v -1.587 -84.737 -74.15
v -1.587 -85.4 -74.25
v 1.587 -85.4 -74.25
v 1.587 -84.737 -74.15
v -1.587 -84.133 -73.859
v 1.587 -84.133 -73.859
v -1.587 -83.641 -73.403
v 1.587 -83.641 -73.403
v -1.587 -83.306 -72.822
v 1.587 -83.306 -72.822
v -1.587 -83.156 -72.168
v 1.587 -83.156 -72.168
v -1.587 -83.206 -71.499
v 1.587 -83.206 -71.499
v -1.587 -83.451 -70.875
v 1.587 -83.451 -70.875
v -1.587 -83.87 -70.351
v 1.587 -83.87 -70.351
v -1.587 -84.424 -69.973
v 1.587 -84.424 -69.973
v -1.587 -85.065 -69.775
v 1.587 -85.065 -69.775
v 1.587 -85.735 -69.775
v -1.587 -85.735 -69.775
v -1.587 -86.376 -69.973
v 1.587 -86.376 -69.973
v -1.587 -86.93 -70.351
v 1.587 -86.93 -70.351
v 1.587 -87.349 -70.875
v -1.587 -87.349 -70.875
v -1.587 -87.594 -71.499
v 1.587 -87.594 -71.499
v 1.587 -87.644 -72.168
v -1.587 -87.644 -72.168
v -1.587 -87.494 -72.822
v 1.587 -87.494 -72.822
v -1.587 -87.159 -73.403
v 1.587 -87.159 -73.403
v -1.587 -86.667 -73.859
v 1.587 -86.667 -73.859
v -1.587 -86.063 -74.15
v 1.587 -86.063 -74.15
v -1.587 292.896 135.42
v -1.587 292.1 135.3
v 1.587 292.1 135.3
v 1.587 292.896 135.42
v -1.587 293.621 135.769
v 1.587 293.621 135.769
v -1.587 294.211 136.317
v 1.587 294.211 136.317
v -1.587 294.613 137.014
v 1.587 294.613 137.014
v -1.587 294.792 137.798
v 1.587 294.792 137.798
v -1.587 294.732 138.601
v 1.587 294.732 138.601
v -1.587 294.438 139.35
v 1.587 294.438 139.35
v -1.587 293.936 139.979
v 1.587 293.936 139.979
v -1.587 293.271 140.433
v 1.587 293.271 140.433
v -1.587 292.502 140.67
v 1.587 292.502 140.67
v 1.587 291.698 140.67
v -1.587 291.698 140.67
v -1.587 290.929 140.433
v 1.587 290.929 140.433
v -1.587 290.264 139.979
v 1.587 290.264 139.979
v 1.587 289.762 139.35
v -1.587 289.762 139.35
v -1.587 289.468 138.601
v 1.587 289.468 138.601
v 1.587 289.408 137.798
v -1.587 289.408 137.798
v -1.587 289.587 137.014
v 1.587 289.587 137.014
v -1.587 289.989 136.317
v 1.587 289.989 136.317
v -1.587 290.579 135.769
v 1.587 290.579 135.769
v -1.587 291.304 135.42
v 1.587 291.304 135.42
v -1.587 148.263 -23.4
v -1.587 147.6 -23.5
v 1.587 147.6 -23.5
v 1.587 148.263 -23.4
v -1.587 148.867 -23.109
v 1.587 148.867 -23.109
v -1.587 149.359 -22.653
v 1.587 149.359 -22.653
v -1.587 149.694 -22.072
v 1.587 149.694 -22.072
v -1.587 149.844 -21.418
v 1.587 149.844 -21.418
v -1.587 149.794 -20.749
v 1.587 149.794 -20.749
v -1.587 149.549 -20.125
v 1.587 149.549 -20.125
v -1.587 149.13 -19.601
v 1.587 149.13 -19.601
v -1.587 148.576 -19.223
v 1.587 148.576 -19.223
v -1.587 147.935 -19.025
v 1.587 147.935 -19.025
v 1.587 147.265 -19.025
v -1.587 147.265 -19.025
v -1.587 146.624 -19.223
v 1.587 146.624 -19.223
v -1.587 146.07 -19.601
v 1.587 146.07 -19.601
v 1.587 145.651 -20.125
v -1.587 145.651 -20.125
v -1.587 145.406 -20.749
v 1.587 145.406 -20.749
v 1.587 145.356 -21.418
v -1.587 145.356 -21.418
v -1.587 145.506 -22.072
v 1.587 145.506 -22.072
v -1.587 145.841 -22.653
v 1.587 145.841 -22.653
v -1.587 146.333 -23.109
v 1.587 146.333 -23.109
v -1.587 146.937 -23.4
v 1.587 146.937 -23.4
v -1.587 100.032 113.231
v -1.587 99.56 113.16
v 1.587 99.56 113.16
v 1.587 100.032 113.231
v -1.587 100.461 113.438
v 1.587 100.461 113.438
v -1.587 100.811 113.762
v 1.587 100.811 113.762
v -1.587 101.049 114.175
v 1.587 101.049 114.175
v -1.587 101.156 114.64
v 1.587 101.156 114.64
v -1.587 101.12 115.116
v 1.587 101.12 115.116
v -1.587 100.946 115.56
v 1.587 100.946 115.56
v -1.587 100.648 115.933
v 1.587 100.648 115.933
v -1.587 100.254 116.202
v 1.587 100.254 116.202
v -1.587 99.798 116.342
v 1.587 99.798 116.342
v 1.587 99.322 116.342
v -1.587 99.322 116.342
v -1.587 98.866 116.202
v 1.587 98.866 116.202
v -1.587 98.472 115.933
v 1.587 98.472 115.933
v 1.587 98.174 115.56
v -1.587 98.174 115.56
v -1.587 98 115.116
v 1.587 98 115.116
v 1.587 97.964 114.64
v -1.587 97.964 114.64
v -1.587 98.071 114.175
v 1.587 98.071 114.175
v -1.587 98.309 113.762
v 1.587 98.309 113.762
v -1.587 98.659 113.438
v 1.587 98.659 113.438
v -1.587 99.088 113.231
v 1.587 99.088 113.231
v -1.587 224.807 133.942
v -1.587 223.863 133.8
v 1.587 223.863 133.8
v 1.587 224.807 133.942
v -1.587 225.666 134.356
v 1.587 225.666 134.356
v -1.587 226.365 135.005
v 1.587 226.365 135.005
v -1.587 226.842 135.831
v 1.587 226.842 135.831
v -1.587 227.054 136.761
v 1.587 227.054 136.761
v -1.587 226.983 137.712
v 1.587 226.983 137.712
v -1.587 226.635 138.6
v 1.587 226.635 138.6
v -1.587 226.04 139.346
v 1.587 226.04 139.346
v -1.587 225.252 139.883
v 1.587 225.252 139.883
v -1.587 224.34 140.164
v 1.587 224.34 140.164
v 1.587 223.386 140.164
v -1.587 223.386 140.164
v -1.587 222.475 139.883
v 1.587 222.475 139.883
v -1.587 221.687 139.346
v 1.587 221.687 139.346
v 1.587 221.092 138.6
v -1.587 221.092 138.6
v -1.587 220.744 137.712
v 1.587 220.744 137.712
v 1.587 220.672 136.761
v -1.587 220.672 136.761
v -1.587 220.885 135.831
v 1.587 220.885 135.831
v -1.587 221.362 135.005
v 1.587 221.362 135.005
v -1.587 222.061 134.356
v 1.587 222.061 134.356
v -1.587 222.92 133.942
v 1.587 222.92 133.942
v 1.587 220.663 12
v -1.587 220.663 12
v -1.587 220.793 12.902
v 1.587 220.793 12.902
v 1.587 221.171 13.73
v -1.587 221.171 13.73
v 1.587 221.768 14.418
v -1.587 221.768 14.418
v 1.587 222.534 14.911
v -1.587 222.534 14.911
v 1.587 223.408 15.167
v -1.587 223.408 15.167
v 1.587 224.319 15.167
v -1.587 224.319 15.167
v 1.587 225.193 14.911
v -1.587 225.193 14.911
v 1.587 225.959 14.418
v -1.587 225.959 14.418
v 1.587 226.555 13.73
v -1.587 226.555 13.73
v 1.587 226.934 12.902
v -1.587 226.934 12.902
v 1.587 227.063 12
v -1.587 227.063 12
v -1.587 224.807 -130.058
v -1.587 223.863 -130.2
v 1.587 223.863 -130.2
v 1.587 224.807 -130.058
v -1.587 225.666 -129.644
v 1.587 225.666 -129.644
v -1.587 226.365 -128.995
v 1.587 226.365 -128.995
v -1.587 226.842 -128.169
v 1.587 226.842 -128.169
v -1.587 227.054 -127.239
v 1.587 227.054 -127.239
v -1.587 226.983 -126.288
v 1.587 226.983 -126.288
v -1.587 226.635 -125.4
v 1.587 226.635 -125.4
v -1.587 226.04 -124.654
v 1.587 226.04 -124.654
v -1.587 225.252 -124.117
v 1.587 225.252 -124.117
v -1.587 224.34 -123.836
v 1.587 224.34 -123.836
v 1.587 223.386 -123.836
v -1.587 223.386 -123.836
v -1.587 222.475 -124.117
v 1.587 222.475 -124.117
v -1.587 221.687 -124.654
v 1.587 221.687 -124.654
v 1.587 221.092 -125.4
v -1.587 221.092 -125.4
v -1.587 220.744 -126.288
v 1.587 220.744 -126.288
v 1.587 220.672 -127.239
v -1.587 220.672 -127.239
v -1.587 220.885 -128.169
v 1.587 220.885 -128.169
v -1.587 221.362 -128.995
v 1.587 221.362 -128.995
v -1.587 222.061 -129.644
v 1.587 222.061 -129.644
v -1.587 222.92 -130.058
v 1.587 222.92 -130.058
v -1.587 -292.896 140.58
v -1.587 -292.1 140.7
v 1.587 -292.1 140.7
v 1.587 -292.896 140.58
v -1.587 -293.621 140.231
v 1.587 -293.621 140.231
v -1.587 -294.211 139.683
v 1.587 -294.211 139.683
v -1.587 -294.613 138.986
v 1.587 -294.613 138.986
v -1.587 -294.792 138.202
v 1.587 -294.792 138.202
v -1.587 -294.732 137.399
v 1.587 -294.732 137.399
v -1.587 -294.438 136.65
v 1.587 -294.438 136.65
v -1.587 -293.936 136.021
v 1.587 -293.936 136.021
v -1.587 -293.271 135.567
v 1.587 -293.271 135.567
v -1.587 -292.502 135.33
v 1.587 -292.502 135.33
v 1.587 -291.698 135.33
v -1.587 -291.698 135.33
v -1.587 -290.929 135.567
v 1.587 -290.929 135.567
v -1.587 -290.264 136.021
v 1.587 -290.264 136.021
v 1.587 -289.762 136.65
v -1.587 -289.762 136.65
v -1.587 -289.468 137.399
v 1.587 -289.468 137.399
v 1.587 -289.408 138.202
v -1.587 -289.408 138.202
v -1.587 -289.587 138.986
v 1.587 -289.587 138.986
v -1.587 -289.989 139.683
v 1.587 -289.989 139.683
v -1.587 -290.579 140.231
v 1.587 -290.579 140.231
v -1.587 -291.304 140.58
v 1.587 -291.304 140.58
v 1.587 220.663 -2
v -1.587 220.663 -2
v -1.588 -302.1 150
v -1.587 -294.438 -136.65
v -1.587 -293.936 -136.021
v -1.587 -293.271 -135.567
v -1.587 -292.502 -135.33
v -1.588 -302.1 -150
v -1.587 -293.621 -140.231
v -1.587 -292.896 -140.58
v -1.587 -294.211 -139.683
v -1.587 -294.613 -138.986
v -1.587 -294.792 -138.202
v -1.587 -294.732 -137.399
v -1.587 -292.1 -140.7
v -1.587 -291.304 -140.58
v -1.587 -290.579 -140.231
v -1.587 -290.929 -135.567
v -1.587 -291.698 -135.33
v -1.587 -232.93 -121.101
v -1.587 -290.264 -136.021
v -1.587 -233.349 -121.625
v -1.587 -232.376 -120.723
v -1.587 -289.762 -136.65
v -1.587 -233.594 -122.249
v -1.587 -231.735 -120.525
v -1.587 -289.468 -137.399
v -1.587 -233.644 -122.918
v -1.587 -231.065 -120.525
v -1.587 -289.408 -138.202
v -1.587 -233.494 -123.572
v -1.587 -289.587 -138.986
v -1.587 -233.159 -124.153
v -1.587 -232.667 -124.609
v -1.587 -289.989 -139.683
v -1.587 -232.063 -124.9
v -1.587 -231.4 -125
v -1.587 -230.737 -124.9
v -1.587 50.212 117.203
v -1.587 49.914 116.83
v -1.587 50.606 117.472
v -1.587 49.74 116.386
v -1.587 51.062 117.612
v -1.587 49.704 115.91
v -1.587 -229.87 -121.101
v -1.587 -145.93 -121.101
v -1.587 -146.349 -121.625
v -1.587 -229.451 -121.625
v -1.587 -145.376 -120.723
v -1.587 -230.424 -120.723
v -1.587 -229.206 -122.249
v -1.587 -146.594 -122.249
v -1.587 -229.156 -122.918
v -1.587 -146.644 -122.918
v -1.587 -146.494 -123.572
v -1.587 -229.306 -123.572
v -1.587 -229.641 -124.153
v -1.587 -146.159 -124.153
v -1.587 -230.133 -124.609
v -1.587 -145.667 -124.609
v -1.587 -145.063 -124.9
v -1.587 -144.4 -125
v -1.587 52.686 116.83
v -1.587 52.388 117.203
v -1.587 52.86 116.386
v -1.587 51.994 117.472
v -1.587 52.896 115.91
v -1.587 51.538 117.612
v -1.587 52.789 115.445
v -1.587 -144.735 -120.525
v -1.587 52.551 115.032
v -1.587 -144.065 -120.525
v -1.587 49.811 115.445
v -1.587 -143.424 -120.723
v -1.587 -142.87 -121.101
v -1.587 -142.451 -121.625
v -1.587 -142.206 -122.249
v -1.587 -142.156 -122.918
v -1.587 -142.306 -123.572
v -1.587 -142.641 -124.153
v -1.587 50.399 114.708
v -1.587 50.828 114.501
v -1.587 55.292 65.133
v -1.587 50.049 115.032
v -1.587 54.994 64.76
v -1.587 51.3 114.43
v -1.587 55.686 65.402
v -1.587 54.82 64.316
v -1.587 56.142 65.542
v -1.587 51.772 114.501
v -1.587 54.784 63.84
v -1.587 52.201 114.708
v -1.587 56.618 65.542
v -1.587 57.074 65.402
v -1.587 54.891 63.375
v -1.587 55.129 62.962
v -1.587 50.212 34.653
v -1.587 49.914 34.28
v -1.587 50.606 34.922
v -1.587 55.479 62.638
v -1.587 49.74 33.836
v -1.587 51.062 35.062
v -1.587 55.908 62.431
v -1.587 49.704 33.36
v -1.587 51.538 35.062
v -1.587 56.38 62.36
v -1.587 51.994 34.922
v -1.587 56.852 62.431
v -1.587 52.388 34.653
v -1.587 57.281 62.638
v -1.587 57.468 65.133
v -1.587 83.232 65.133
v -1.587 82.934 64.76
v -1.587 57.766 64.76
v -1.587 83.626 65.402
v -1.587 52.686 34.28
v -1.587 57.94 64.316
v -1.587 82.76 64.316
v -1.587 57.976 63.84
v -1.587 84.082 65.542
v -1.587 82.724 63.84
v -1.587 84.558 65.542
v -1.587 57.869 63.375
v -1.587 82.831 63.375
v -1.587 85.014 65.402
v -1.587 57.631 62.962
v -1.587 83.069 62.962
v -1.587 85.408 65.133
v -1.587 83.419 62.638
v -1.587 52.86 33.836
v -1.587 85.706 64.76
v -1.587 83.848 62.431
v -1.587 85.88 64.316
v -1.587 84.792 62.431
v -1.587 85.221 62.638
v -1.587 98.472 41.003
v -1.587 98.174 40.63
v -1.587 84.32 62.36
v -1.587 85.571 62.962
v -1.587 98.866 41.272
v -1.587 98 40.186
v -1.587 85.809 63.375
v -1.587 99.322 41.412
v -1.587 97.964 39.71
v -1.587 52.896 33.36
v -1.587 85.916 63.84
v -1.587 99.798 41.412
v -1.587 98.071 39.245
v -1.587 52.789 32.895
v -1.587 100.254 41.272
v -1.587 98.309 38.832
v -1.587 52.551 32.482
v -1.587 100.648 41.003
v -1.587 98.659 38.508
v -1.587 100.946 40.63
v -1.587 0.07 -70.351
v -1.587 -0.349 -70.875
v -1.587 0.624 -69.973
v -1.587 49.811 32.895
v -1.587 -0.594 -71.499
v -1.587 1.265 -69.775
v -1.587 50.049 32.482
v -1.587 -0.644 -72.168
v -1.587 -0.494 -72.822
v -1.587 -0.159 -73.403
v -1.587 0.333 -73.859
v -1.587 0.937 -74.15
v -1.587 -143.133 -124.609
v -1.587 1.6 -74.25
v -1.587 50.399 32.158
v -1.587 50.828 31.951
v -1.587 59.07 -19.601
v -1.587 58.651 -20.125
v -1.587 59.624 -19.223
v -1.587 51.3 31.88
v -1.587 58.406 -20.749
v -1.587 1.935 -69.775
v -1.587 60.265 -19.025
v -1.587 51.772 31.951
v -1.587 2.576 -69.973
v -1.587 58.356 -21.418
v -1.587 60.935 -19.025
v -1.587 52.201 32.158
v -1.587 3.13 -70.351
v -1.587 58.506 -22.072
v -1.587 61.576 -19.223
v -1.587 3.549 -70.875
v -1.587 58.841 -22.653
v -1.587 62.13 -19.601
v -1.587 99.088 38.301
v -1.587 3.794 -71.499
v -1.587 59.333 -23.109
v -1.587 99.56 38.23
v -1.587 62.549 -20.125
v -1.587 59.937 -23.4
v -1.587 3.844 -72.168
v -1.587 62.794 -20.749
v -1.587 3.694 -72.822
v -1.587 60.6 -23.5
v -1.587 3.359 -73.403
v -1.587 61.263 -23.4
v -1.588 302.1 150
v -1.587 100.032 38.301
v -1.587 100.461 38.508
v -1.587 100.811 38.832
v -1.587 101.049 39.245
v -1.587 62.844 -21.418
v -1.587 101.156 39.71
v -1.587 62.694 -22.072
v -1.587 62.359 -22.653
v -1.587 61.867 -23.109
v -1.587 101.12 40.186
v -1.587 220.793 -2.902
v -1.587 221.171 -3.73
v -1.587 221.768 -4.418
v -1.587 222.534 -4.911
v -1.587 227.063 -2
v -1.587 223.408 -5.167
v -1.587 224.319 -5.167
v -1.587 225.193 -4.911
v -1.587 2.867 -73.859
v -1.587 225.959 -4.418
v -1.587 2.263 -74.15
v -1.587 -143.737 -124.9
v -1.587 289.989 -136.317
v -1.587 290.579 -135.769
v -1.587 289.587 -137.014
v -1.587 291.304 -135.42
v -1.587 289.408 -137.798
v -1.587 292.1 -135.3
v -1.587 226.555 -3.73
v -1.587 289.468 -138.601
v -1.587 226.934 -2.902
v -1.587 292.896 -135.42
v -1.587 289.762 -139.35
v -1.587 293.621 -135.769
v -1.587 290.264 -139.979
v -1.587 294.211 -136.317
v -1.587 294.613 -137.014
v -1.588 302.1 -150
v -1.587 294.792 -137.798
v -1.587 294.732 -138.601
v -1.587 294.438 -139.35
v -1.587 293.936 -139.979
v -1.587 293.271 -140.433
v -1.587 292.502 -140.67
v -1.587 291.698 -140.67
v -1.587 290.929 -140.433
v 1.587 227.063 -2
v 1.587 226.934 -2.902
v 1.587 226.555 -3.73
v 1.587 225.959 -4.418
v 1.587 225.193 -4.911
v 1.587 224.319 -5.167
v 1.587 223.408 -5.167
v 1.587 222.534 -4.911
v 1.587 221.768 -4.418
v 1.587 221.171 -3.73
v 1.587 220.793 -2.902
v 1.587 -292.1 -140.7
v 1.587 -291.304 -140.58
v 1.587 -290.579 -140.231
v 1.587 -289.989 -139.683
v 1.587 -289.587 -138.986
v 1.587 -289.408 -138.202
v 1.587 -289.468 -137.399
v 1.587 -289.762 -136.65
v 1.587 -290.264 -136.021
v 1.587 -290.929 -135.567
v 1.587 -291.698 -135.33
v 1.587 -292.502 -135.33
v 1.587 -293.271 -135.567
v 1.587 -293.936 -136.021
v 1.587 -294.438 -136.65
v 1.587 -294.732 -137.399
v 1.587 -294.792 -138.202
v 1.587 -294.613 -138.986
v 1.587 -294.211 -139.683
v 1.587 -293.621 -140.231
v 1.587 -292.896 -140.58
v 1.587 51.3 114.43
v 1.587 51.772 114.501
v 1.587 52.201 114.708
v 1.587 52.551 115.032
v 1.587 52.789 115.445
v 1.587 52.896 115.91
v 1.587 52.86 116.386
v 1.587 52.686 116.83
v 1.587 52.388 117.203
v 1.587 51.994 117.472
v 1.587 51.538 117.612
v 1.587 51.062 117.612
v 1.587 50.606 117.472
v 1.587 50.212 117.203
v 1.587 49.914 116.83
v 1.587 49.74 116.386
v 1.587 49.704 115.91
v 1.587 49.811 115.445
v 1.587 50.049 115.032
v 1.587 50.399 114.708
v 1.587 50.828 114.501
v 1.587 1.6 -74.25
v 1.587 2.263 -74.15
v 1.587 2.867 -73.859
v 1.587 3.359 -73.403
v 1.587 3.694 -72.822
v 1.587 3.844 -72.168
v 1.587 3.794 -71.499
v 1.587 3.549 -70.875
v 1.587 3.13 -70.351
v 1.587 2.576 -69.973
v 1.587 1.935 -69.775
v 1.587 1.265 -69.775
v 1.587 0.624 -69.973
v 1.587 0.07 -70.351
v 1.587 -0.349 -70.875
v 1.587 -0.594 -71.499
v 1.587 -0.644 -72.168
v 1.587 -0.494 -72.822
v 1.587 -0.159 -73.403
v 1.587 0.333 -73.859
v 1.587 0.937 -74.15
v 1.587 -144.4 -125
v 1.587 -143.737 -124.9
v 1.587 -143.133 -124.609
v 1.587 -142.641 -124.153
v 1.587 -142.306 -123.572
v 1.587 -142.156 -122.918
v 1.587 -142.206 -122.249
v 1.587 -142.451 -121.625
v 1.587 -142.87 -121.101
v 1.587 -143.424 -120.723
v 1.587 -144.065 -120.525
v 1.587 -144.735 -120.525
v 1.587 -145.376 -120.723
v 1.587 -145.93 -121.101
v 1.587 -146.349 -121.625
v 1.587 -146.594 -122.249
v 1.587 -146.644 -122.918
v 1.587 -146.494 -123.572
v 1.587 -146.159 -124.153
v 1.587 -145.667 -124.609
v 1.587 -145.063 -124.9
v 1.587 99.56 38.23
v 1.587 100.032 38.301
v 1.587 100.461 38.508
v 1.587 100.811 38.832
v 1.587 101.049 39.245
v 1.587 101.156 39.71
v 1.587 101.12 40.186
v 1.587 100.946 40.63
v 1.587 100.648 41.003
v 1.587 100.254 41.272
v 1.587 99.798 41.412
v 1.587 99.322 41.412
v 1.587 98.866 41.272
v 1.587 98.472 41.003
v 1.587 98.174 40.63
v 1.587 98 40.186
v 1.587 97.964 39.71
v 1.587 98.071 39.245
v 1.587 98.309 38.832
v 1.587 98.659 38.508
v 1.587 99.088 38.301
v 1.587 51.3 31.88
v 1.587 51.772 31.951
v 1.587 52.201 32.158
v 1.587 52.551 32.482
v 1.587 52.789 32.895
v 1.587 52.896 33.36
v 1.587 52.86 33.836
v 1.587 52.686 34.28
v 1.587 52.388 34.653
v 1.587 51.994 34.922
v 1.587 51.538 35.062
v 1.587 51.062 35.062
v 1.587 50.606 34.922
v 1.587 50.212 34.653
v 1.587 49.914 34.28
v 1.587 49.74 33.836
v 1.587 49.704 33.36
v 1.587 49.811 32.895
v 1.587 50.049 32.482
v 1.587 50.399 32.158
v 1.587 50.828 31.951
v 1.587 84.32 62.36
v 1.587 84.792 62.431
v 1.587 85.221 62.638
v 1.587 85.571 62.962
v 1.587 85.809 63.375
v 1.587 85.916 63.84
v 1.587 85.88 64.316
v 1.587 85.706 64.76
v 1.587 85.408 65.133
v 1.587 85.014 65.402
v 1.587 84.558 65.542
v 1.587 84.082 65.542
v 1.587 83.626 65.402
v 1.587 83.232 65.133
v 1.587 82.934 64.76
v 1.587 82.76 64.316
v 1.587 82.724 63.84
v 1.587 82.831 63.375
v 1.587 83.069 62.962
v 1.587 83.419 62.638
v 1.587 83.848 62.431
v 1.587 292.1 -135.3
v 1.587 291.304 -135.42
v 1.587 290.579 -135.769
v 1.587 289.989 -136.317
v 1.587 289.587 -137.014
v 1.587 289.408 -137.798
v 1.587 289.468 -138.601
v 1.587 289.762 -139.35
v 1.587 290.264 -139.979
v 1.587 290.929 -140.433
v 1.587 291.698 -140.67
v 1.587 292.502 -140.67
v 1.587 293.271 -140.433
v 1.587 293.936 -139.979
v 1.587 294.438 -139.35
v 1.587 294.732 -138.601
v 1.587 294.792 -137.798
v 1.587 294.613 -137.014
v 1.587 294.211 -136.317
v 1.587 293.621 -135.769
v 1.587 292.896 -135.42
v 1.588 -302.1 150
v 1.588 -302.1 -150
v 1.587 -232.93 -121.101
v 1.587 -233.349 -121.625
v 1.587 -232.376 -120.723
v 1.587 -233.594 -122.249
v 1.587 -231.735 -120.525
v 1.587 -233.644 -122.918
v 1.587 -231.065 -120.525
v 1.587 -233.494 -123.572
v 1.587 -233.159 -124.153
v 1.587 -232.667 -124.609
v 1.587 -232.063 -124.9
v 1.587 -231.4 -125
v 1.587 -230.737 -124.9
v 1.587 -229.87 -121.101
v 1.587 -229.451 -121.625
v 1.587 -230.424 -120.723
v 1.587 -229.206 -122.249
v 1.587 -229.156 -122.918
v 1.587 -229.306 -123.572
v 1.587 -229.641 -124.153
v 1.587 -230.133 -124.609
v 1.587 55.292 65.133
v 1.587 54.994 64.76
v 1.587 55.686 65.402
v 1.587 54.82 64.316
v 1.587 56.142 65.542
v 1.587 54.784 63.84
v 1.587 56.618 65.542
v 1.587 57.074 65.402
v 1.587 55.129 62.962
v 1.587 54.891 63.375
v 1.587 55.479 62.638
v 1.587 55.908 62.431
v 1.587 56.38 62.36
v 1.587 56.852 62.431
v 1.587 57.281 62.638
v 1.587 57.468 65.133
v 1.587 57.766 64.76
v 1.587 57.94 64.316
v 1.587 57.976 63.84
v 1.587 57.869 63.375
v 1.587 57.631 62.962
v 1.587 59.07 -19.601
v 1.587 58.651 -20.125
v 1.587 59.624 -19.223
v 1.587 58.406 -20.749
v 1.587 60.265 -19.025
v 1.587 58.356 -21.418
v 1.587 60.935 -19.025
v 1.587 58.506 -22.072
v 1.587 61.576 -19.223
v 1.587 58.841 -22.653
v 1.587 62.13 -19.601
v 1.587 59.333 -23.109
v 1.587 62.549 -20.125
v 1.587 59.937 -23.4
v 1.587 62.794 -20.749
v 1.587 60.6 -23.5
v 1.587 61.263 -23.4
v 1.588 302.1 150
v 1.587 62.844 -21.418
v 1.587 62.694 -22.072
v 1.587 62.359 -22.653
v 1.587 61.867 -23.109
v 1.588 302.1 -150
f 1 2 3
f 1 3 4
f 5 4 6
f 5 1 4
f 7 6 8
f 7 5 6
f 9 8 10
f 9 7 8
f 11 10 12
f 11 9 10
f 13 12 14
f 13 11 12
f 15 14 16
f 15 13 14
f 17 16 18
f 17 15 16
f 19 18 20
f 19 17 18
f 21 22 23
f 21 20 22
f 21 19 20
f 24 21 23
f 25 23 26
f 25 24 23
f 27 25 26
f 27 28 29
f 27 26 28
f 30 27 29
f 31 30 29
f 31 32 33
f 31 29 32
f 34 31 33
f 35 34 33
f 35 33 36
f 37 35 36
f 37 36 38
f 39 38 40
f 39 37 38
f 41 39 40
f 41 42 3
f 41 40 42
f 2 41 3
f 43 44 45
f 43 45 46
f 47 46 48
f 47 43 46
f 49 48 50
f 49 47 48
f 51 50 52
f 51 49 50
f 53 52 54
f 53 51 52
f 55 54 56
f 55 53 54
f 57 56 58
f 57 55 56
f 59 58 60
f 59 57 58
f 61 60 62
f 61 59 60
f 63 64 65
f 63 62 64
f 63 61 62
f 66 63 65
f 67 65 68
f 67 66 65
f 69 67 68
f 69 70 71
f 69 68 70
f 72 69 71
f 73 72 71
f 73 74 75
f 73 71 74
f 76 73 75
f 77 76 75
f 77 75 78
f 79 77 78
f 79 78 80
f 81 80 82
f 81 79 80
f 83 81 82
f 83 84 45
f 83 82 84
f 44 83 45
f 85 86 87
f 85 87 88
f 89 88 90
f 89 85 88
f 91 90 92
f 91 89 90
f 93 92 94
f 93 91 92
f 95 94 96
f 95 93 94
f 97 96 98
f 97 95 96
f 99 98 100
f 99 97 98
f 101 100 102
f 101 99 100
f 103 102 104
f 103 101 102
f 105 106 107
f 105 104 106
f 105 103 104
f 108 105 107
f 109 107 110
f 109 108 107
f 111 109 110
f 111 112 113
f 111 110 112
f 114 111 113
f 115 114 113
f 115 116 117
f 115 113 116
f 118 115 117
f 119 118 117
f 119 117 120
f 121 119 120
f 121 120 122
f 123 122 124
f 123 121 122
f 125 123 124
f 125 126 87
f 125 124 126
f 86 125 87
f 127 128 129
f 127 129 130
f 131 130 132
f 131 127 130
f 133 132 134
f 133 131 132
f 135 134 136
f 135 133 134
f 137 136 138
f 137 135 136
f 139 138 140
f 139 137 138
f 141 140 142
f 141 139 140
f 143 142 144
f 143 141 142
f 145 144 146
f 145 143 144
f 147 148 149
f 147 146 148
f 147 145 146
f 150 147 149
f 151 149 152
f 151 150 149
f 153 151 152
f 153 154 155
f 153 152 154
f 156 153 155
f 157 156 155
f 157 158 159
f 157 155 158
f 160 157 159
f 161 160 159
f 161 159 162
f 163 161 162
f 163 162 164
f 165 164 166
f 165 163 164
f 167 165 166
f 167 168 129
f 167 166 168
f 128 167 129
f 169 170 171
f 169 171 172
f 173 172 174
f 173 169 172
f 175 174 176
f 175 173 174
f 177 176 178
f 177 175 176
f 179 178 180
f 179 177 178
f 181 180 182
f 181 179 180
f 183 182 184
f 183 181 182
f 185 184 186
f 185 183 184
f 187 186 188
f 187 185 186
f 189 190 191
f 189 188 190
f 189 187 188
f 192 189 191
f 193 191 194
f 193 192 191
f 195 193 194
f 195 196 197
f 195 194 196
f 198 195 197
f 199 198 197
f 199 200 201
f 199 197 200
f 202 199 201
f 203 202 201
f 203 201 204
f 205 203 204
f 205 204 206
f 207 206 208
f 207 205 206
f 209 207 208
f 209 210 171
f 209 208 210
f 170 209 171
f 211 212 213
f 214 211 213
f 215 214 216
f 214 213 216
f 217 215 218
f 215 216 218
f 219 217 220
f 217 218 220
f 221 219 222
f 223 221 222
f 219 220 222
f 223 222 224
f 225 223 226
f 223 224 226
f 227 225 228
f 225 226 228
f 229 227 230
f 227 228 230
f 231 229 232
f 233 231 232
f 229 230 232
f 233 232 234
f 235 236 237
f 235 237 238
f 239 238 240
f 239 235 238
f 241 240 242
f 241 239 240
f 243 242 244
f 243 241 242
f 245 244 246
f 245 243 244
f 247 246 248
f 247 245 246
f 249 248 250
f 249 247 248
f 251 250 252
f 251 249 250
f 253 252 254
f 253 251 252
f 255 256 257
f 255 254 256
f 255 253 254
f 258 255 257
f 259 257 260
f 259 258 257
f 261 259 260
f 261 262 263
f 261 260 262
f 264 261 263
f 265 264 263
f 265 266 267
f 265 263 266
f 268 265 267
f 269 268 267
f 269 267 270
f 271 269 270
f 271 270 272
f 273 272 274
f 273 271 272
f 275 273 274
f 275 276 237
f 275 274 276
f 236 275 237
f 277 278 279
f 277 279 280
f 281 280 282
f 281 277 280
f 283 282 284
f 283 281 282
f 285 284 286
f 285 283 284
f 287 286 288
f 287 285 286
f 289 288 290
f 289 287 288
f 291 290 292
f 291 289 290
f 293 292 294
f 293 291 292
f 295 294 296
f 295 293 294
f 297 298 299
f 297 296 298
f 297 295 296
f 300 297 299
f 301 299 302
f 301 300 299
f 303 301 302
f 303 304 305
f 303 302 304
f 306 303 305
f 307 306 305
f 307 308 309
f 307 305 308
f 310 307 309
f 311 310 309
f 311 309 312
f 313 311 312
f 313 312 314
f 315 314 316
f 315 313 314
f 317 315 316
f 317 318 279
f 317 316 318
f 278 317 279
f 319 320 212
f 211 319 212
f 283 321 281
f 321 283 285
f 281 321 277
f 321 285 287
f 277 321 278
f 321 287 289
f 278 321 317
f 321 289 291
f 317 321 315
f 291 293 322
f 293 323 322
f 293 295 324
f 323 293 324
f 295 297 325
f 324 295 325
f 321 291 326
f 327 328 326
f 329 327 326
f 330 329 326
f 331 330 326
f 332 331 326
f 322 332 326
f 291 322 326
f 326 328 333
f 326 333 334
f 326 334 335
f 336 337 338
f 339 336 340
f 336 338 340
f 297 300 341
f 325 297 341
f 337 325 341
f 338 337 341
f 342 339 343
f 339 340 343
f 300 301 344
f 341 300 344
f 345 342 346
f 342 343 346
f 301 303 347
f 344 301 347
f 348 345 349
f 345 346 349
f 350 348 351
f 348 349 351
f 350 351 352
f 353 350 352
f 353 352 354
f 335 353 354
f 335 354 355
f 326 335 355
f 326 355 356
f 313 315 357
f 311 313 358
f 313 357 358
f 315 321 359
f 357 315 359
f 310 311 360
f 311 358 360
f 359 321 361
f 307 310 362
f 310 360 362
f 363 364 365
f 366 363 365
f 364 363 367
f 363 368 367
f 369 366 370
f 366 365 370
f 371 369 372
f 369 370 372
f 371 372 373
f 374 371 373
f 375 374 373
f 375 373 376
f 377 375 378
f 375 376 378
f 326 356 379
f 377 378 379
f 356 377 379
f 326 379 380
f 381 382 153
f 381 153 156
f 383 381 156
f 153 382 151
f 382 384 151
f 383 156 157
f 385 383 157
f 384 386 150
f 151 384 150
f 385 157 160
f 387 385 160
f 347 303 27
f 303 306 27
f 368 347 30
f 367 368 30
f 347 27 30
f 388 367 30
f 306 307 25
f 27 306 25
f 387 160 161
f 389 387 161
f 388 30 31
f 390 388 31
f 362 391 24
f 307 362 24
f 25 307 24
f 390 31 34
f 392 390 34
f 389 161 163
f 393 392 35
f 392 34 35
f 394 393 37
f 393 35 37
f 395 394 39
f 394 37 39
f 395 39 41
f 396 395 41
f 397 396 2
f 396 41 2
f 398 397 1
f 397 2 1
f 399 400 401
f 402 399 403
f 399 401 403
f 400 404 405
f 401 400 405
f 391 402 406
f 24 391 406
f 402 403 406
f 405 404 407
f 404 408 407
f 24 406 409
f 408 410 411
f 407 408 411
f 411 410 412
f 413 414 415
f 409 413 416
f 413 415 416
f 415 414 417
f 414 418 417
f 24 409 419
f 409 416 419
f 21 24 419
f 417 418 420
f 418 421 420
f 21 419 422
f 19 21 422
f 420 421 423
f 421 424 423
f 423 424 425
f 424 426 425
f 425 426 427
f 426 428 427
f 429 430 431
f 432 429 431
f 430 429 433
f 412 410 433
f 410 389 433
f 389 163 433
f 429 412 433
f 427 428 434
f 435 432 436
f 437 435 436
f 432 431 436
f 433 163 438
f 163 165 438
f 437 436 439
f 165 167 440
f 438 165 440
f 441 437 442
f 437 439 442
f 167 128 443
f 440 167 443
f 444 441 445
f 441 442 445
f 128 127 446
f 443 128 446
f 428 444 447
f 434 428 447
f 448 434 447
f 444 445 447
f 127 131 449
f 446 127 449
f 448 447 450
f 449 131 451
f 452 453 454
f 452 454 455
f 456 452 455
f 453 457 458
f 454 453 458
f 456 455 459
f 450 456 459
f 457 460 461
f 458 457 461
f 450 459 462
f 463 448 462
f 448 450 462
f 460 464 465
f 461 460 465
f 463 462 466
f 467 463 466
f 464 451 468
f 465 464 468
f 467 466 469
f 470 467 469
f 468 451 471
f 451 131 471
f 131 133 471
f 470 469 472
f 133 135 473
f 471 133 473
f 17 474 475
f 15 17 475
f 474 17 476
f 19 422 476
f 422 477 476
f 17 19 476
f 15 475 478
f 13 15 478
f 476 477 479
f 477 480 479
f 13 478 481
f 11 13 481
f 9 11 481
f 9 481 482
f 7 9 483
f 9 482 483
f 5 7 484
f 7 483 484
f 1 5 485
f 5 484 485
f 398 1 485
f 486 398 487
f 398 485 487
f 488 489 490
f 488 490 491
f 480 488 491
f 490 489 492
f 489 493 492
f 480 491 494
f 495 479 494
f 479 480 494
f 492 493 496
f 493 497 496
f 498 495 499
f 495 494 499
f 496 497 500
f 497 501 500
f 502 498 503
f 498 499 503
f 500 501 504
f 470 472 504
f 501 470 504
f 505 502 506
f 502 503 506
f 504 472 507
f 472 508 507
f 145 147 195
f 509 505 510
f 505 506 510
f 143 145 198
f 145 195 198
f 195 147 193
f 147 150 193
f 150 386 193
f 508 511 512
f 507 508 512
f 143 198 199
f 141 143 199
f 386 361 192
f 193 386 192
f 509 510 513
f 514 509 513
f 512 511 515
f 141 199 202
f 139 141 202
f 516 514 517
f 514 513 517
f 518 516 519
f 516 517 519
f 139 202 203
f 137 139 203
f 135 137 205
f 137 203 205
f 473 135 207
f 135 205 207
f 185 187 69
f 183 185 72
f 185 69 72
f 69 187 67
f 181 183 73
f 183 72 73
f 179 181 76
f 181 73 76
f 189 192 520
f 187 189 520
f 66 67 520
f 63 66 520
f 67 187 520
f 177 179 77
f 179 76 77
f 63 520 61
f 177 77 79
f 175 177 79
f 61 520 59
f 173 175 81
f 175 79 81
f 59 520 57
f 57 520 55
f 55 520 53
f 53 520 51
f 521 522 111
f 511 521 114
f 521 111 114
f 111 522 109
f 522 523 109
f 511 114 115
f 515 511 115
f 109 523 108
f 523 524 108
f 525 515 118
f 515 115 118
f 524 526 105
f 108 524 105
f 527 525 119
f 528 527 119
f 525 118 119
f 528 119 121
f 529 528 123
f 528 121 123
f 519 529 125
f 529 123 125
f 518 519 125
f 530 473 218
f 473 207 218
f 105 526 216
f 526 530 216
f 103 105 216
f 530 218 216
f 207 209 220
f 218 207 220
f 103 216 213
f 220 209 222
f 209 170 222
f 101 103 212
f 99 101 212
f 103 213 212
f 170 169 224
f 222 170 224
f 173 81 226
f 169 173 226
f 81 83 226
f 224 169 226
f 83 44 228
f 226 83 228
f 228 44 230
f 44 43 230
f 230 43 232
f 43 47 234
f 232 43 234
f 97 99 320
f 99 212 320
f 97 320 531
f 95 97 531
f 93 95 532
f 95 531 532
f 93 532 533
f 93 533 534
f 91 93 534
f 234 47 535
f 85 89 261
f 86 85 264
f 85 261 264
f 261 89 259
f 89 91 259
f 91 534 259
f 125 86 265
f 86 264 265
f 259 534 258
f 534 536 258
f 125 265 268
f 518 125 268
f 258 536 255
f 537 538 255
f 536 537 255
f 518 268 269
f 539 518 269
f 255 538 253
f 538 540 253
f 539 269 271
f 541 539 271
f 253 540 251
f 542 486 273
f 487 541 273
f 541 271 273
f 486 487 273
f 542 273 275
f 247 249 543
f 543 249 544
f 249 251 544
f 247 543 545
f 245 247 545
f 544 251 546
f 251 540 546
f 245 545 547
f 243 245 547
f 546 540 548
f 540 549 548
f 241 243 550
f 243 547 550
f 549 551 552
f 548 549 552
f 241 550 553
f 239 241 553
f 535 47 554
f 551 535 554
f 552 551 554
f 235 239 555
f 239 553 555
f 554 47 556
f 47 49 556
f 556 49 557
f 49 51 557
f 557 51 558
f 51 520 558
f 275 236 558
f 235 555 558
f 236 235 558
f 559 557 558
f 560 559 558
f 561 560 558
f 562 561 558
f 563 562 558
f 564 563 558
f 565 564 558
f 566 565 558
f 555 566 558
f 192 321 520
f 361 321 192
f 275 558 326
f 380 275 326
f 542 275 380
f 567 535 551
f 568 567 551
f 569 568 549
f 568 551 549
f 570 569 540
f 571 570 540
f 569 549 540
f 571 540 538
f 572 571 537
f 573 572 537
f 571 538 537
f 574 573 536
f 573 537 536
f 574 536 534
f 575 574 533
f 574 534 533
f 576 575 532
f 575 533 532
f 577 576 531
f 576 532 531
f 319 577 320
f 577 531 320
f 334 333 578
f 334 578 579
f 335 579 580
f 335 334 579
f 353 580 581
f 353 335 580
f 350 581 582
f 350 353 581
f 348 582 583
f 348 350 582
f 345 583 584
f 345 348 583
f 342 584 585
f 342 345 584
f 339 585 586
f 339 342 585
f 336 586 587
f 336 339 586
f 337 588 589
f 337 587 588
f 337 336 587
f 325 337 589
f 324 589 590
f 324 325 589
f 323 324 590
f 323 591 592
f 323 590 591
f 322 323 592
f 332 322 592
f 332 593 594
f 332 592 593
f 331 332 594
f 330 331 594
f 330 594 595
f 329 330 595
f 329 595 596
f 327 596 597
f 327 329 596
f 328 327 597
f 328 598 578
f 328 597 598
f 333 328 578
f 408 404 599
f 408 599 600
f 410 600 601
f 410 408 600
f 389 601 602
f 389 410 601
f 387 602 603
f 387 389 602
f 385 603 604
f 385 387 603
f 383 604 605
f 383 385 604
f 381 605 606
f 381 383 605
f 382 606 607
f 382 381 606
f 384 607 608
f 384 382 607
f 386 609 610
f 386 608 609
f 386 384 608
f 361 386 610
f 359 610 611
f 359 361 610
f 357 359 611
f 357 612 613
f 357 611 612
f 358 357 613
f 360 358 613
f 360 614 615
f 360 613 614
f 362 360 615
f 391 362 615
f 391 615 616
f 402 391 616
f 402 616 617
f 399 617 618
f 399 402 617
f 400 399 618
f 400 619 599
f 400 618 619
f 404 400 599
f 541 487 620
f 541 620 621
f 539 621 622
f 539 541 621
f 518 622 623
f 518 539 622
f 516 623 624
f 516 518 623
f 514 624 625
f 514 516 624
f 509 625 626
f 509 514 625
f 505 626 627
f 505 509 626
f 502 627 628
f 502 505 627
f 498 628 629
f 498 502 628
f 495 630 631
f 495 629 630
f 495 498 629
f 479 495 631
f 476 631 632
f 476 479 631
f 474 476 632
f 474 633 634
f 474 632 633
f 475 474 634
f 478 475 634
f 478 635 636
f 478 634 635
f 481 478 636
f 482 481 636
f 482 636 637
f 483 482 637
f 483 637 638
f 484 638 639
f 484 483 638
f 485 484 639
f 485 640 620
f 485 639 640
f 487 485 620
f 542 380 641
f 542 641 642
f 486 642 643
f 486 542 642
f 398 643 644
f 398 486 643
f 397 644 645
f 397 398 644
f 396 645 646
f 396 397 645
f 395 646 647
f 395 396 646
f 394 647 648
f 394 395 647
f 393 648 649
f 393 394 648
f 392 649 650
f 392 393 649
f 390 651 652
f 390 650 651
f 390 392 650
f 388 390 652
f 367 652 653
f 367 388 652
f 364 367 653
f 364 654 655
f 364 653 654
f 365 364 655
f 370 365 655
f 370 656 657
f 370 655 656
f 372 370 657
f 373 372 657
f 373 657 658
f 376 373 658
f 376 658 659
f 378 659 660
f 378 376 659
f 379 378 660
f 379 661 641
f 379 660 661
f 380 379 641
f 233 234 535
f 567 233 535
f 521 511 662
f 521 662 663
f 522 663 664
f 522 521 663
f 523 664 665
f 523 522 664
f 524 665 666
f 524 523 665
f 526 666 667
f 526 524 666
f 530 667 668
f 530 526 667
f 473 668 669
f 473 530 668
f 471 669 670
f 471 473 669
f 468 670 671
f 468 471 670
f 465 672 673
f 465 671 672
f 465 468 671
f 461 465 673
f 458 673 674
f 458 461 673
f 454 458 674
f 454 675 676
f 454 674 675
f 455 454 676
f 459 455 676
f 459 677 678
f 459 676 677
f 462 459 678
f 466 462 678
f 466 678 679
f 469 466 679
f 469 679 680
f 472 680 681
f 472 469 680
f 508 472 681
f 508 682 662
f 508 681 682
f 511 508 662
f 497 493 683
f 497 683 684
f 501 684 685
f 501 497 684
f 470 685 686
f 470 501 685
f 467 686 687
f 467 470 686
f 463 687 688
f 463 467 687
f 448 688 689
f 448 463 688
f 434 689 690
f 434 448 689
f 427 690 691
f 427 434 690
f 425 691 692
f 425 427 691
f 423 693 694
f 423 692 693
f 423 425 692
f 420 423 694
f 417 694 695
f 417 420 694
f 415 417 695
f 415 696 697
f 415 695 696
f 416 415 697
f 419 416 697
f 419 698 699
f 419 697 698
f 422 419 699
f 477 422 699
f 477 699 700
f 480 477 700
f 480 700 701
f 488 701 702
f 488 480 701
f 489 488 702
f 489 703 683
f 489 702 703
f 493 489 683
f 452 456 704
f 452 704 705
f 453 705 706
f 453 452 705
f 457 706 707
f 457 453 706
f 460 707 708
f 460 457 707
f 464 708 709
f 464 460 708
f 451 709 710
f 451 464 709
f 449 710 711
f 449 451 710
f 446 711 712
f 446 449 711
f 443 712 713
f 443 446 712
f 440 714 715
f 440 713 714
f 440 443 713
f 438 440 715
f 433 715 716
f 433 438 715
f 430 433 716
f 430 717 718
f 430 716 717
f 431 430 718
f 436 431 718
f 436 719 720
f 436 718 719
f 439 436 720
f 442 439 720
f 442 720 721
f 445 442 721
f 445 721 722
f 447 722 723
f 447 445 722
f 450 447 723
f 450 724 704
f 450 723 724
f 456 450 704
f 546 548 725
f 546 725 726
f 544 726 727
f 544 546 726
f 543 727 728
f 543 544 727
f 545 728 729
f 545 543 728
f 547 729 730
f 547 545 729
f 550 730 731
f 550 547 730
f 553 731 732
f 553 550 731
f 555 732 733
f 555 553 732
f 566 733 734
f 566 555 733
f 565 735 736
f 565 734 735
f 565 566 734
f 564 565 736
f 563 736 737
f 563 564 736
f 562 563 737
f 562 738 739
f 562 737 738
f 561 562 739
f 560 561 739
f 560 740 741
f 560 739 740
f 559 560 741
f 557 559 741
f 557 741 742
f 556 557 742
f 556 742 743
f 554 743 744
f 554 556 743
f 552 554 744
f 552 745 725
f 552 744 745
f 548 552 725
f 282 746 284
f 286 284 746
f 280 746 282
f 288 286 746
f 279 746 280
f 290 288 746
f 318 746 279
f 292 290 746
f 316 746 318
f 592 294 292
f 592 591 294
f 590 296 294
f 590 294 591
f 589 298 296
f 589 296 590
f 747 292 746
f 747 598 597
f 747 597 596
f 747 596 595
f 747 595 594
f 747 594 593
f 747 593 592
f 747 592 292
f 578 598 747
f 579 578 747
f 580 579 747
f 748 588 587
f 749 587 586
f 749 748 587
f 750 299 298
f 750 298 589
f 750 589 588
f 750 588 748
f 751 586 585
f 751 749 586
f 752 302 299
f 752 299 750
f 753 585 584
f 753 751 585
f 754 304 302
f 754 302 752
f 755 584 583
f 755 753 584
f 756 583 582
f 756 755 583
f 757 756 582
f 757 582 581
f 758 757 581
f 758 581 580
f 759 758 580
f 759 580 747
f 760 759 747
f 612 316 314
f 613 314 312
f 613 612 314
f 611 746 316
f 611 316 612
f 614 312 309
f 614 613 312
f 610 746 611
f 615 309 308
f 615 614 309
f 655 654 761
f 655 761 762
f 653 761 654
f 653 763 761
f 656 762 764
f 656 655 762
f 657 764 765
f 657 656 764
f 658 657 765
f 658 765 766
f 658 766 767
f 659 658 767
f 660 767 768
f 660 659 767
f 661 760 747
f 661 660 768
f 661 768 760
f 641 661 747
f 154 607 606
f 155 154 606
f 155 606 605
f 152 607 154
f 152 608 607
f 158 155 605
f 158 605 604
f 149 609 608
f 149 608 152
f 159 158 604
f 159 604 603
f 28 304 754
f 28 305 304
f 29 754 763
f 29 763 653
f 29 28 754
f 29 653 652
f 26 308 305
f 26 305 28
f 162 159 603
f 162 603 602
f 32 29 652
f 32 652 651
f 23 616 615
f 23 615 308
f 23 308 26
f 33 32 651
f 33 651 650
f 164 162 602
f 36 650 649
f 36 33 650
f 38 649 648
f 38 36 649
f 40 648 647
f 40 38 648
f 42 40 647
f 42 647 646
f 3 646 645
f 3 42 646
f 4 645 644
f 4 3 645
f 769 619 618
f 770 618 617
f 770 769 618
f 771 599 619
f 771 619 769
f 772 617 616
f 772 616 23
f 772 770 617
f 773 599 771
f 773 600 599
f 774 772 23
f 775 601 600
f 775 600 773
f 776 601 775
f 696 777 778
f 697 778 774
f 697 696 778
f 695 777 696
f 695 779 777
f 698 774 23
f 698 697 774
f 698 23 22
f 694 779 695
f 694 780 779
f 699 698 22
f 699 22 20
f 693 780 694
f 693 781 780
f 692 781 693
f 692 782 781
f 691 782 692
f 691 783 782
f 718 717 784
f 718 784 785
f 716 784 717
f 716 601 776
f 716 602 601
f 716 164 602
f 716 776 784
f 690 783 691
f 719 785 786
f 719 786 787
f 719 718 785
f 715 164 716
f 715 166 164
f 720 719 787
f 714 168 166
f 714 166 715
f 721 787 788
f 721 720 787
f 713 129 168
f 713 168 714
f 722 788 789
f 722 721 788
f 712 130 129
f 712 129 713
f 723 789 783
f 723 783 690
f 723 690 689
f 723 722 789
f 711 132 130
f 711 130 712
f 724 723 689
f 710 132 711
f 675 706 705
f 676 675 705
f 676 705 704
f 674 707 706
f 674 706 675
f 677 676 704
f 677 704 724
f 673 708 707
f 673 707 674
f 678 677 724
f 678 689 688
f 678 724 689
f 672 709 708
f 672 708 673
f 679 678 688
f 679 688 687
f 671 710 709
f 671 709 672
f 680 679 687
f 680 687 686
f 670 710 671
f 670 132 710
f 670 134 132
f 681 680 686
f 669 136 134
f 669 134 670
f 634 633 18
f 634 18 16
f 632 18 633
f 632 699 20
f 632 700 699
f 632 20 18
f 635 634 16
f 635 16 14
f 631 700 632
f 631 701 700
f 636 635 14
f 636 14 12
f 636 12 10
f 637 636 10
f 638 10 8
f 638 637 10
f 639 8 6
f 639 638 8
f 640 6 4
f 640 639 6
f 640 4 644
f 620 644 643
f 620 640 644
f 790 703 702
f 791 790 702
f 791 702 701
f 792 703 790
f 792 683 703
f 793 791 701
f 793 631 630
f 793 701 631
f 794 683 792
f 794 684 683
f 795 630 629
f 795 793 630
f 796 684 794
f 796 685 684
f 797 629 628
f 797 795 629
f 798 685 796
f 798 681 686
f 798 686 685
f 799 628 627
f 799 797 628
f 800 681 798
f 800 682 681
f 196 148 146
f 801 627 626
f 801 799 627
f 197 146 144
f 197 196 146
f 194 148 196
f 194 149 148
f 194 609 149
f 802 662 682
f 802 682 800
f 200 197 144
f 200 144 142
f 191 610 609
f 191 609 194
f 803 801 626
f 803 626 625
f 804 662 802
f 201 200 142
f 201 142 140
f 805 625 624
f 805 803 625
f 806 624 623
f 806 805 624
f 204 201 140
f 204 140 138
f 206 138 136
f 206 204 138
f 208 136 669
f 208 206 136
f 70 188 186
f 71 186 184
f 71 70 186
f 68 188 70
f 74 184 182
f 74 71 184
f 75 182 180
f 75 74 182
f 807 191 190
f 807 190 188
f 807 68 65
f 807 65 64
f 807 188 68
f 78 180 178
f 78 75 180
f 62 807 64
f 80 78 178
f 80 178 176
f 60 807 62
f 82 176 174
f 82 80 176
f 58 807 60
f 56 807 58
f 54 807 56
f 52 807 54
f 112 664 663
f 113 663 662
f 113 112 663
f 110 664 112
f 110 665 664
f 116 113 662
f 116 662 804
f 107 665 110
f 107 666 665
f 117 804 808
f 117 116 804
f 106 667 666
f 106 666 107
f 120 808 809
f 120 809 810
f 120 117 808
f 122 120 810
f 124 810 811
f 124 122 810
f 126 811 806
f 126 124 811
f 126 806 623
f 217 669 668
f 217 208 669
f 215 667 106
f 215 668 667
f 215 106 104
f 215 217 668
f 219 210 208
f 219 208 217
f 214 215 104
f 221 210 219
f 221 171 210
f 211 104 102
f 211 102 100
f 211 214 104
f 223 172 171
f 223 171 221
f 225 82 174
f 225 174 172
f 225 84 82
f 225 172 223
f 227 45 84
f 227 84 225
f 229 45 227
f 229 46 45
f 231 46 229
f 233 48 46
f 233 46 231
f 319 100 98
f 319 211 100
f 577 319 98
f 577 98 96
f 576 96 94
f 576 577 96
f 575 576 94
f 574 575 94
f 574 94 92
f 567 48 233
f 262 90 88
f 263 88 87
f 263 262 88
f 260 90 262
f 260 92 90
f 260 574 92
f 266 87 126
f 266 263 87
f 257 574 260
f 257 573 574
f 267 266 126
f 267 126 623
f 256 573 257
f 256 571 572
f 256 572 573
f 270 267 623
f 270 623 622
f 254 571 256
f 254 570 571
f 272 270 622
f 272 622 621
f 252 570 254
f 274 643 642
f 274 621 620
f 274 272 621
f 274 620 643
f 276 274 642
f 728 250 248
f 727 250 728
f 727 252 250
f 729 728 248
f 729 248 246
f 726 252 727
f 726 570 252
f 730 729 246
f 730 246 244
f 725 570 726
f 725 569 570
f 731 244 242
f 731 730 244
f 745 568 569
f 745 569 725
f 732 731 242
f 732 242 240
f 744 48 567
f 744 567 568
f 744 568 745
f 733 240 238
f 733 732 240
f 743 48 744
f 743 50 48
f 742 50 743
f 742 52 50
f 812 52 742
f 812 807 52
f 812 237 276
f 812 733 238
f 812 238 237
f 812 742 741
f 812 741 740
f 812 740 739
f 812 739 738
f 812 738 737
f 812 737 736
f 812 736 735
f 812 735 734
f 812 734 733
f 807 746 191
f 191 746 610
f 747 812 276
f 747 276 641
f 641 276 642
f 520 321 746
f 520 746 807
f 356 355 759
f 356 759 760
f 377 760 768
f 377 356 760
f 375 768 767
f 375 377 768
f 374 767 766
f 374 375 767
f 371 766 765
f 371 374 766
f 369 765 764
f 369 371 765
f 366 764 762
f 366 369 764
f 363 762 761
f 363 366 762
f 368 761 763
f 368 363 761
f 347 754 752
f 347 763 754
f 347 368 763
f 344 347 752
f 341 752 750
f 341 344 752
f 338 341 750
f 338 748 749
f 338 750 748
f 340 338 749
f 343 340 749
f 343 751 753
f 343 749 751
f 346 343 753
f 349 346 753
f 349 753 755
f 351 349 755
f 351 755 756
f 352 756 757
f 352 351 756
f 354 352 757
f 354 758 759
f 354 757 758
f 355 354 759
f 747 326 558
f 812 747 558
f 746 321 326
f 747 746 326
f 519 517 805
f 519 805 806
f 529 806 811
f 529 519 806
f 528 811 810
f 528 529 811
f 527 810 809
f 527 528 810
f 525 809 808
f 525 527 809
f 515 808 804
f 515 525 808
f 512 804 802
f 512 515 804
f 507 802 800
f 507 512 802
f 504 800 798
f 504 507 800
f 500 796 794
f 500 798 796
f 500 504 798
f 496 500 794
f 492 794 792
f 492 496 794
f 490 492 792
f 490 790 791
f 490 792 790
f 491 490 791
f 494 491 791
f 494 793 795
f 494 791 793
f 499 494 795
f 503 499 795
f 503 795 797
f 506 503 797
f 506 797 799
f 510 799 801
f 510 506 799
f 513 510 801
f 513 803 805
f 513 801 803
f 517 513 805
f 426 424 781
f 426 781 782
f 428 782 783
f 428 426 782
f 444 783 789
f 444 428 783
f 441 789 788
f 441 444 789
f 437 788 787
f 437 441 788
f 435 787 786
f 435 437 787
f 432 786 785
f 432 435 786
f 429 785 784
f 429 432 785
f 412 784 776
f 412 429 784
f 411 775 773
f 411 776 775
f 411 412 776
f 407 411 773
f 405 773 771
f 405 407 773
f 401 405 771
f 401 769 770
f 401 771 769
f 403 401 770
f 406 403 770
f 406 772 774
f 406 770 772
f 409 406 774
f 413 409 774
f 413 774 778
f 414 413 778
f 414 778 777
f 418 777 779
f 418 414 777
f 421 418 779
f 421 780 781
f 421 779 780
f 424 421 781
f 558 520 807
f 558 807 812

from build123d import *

# Parameters (mm, degrees)
BOSS_EXTRUDE1_DEPTH      = 1.5875
BOSS_EXTRUDE1_DEPTH_BACK = 1.5875
SKETCH1_W                = 300
SKETCH1_H                = 604.2
CUT_EXTRUDE1_DEPTH       = 338.29353708
CUT_EXTRUDE1_DEPTH_BACK  = 338.29353708
SKETCH2_R                = 2.7
CUT_EXTRUDE2_DEPTH       = 338.29353708
CUT_EXTRUDE2_DEPTH_BACK  = 338.29353708
SKETCH3_R                = 1.6
SKETCH3_R_2              = 2.25
SKETCH3_R_3              = 3.2


with BuildPart() as part:
    # Sketch1 → Boss-Extrude1 (new, two sides: drawn at the far end of the back side and taken through both)
    with BuildSketch(Plane(origin=(0, 0, 0), x_dir=(0, 0, -1), z_dir=(1, 0, 0)).offset(-BOSS_EXTRUDE1_DEPTH_BACK)):
        Rectangle(SKETCH1_W, SKETCH1_H)
    extrude(amount=BOSS_EXTRUDE1_DEPTH + BOSS_EXTRUDE1_DEPTH_BACK)

    # Sketch2 → Cut-Extrude1 (cut, two sides: drawn at the far end of the back side and taken through both)
    with BuildSketch(Plane(origin=(0, 0, 0), x_dir=(0, 0, -1), z_dir=(1, 0, 0)).offset(-CUT_EXTRUDE1_DEPTH_BACK)):
        with Locations((-138, 292.1)):
            Circle(SKETCH2_R)
        with Locations((138, 292.1)):
            Circle(SKETCH2_R)
        with Locations((138, -292.1)):
            Circle(SKETCH2_R)
        with Locations((-138, -292.1)):
            Circle(SKETCH2_R)
    extrude(amount=CUT_EXTRUDE1_DEPTH + CUT_EXTRUDE1_DEPTH_BACK, mode=Mode.SUBTRACT)

    # Sketch3 → Cut-Extrude2 (cut, two sides: drawn at the far end of the back side and taken through both)
    with BuildSketch(Plane(origin=(0, 0, 0), x_dir=(0, 0, -1), z_dir=(1, 0, 0)).offset(-CUT_EXTRUDE2_DEPTH_BACK)):
        with Locations((-116.03, 51.300005788)):
            Circle(SKETCH3_R)
        with Locations((-114.76, 99.560005788)):
            Circle(SKETCH3_R)
        with Locations((-63.96, 56.380005788)):
            Circle(SKETCH3_R)
        with Locations((-63.96, 84.320005788)):
            Circle(SKETCH3_R)
        with Locations((-33.48, 51.300005788)):
            Circle(SKETCH3_R)
        with Locations((-39.83, 99.560005788)):
            Circle(SKETCH3_R)
        with Locations((21.25, 60.6)):
            Circle(SKETCH3_R_2)
        with Locations((21.25, 147.6)):
            Circle(SKETCH3_R_2)
        with Locations((72, 1.6)):
            Circle(SKETCH3_R_2)
        with Locations((72, -85.4)):
            Circle(SKETCH3_R_2)
        with Locations((122.75, -144.4)):
            Circle(SKETCH3_R_2)
        with Locations((122.75, -231.4)):
            Circle(SKETCH3_R_2)
        with Locations((-137, 223.8634)):
            Circle(SKETCH3_R_3)
        with Locations((127, 223.8634)):
            Circle(SKETCH3_R_3)
        with BuildLine():
            Line((-12, 227.0634), (2, 227.0634))
            ThreePointArc((2, 227.0634), (5.2, 223.8634), (2, 220.6634))
            Line((2, 220.6634), (-12, 220.6634))
            ThreePointArc((-12, 220.6634), (-15.2, 223.8634), (-12, 227.0634))
        make_face()
    extrude(amount=CUT_EXTRUDE2_DEPTH + CUT_EXTRUDE2_DEPTH_BACK, mode=Mode.SUBTRACT)


solid = part.part
